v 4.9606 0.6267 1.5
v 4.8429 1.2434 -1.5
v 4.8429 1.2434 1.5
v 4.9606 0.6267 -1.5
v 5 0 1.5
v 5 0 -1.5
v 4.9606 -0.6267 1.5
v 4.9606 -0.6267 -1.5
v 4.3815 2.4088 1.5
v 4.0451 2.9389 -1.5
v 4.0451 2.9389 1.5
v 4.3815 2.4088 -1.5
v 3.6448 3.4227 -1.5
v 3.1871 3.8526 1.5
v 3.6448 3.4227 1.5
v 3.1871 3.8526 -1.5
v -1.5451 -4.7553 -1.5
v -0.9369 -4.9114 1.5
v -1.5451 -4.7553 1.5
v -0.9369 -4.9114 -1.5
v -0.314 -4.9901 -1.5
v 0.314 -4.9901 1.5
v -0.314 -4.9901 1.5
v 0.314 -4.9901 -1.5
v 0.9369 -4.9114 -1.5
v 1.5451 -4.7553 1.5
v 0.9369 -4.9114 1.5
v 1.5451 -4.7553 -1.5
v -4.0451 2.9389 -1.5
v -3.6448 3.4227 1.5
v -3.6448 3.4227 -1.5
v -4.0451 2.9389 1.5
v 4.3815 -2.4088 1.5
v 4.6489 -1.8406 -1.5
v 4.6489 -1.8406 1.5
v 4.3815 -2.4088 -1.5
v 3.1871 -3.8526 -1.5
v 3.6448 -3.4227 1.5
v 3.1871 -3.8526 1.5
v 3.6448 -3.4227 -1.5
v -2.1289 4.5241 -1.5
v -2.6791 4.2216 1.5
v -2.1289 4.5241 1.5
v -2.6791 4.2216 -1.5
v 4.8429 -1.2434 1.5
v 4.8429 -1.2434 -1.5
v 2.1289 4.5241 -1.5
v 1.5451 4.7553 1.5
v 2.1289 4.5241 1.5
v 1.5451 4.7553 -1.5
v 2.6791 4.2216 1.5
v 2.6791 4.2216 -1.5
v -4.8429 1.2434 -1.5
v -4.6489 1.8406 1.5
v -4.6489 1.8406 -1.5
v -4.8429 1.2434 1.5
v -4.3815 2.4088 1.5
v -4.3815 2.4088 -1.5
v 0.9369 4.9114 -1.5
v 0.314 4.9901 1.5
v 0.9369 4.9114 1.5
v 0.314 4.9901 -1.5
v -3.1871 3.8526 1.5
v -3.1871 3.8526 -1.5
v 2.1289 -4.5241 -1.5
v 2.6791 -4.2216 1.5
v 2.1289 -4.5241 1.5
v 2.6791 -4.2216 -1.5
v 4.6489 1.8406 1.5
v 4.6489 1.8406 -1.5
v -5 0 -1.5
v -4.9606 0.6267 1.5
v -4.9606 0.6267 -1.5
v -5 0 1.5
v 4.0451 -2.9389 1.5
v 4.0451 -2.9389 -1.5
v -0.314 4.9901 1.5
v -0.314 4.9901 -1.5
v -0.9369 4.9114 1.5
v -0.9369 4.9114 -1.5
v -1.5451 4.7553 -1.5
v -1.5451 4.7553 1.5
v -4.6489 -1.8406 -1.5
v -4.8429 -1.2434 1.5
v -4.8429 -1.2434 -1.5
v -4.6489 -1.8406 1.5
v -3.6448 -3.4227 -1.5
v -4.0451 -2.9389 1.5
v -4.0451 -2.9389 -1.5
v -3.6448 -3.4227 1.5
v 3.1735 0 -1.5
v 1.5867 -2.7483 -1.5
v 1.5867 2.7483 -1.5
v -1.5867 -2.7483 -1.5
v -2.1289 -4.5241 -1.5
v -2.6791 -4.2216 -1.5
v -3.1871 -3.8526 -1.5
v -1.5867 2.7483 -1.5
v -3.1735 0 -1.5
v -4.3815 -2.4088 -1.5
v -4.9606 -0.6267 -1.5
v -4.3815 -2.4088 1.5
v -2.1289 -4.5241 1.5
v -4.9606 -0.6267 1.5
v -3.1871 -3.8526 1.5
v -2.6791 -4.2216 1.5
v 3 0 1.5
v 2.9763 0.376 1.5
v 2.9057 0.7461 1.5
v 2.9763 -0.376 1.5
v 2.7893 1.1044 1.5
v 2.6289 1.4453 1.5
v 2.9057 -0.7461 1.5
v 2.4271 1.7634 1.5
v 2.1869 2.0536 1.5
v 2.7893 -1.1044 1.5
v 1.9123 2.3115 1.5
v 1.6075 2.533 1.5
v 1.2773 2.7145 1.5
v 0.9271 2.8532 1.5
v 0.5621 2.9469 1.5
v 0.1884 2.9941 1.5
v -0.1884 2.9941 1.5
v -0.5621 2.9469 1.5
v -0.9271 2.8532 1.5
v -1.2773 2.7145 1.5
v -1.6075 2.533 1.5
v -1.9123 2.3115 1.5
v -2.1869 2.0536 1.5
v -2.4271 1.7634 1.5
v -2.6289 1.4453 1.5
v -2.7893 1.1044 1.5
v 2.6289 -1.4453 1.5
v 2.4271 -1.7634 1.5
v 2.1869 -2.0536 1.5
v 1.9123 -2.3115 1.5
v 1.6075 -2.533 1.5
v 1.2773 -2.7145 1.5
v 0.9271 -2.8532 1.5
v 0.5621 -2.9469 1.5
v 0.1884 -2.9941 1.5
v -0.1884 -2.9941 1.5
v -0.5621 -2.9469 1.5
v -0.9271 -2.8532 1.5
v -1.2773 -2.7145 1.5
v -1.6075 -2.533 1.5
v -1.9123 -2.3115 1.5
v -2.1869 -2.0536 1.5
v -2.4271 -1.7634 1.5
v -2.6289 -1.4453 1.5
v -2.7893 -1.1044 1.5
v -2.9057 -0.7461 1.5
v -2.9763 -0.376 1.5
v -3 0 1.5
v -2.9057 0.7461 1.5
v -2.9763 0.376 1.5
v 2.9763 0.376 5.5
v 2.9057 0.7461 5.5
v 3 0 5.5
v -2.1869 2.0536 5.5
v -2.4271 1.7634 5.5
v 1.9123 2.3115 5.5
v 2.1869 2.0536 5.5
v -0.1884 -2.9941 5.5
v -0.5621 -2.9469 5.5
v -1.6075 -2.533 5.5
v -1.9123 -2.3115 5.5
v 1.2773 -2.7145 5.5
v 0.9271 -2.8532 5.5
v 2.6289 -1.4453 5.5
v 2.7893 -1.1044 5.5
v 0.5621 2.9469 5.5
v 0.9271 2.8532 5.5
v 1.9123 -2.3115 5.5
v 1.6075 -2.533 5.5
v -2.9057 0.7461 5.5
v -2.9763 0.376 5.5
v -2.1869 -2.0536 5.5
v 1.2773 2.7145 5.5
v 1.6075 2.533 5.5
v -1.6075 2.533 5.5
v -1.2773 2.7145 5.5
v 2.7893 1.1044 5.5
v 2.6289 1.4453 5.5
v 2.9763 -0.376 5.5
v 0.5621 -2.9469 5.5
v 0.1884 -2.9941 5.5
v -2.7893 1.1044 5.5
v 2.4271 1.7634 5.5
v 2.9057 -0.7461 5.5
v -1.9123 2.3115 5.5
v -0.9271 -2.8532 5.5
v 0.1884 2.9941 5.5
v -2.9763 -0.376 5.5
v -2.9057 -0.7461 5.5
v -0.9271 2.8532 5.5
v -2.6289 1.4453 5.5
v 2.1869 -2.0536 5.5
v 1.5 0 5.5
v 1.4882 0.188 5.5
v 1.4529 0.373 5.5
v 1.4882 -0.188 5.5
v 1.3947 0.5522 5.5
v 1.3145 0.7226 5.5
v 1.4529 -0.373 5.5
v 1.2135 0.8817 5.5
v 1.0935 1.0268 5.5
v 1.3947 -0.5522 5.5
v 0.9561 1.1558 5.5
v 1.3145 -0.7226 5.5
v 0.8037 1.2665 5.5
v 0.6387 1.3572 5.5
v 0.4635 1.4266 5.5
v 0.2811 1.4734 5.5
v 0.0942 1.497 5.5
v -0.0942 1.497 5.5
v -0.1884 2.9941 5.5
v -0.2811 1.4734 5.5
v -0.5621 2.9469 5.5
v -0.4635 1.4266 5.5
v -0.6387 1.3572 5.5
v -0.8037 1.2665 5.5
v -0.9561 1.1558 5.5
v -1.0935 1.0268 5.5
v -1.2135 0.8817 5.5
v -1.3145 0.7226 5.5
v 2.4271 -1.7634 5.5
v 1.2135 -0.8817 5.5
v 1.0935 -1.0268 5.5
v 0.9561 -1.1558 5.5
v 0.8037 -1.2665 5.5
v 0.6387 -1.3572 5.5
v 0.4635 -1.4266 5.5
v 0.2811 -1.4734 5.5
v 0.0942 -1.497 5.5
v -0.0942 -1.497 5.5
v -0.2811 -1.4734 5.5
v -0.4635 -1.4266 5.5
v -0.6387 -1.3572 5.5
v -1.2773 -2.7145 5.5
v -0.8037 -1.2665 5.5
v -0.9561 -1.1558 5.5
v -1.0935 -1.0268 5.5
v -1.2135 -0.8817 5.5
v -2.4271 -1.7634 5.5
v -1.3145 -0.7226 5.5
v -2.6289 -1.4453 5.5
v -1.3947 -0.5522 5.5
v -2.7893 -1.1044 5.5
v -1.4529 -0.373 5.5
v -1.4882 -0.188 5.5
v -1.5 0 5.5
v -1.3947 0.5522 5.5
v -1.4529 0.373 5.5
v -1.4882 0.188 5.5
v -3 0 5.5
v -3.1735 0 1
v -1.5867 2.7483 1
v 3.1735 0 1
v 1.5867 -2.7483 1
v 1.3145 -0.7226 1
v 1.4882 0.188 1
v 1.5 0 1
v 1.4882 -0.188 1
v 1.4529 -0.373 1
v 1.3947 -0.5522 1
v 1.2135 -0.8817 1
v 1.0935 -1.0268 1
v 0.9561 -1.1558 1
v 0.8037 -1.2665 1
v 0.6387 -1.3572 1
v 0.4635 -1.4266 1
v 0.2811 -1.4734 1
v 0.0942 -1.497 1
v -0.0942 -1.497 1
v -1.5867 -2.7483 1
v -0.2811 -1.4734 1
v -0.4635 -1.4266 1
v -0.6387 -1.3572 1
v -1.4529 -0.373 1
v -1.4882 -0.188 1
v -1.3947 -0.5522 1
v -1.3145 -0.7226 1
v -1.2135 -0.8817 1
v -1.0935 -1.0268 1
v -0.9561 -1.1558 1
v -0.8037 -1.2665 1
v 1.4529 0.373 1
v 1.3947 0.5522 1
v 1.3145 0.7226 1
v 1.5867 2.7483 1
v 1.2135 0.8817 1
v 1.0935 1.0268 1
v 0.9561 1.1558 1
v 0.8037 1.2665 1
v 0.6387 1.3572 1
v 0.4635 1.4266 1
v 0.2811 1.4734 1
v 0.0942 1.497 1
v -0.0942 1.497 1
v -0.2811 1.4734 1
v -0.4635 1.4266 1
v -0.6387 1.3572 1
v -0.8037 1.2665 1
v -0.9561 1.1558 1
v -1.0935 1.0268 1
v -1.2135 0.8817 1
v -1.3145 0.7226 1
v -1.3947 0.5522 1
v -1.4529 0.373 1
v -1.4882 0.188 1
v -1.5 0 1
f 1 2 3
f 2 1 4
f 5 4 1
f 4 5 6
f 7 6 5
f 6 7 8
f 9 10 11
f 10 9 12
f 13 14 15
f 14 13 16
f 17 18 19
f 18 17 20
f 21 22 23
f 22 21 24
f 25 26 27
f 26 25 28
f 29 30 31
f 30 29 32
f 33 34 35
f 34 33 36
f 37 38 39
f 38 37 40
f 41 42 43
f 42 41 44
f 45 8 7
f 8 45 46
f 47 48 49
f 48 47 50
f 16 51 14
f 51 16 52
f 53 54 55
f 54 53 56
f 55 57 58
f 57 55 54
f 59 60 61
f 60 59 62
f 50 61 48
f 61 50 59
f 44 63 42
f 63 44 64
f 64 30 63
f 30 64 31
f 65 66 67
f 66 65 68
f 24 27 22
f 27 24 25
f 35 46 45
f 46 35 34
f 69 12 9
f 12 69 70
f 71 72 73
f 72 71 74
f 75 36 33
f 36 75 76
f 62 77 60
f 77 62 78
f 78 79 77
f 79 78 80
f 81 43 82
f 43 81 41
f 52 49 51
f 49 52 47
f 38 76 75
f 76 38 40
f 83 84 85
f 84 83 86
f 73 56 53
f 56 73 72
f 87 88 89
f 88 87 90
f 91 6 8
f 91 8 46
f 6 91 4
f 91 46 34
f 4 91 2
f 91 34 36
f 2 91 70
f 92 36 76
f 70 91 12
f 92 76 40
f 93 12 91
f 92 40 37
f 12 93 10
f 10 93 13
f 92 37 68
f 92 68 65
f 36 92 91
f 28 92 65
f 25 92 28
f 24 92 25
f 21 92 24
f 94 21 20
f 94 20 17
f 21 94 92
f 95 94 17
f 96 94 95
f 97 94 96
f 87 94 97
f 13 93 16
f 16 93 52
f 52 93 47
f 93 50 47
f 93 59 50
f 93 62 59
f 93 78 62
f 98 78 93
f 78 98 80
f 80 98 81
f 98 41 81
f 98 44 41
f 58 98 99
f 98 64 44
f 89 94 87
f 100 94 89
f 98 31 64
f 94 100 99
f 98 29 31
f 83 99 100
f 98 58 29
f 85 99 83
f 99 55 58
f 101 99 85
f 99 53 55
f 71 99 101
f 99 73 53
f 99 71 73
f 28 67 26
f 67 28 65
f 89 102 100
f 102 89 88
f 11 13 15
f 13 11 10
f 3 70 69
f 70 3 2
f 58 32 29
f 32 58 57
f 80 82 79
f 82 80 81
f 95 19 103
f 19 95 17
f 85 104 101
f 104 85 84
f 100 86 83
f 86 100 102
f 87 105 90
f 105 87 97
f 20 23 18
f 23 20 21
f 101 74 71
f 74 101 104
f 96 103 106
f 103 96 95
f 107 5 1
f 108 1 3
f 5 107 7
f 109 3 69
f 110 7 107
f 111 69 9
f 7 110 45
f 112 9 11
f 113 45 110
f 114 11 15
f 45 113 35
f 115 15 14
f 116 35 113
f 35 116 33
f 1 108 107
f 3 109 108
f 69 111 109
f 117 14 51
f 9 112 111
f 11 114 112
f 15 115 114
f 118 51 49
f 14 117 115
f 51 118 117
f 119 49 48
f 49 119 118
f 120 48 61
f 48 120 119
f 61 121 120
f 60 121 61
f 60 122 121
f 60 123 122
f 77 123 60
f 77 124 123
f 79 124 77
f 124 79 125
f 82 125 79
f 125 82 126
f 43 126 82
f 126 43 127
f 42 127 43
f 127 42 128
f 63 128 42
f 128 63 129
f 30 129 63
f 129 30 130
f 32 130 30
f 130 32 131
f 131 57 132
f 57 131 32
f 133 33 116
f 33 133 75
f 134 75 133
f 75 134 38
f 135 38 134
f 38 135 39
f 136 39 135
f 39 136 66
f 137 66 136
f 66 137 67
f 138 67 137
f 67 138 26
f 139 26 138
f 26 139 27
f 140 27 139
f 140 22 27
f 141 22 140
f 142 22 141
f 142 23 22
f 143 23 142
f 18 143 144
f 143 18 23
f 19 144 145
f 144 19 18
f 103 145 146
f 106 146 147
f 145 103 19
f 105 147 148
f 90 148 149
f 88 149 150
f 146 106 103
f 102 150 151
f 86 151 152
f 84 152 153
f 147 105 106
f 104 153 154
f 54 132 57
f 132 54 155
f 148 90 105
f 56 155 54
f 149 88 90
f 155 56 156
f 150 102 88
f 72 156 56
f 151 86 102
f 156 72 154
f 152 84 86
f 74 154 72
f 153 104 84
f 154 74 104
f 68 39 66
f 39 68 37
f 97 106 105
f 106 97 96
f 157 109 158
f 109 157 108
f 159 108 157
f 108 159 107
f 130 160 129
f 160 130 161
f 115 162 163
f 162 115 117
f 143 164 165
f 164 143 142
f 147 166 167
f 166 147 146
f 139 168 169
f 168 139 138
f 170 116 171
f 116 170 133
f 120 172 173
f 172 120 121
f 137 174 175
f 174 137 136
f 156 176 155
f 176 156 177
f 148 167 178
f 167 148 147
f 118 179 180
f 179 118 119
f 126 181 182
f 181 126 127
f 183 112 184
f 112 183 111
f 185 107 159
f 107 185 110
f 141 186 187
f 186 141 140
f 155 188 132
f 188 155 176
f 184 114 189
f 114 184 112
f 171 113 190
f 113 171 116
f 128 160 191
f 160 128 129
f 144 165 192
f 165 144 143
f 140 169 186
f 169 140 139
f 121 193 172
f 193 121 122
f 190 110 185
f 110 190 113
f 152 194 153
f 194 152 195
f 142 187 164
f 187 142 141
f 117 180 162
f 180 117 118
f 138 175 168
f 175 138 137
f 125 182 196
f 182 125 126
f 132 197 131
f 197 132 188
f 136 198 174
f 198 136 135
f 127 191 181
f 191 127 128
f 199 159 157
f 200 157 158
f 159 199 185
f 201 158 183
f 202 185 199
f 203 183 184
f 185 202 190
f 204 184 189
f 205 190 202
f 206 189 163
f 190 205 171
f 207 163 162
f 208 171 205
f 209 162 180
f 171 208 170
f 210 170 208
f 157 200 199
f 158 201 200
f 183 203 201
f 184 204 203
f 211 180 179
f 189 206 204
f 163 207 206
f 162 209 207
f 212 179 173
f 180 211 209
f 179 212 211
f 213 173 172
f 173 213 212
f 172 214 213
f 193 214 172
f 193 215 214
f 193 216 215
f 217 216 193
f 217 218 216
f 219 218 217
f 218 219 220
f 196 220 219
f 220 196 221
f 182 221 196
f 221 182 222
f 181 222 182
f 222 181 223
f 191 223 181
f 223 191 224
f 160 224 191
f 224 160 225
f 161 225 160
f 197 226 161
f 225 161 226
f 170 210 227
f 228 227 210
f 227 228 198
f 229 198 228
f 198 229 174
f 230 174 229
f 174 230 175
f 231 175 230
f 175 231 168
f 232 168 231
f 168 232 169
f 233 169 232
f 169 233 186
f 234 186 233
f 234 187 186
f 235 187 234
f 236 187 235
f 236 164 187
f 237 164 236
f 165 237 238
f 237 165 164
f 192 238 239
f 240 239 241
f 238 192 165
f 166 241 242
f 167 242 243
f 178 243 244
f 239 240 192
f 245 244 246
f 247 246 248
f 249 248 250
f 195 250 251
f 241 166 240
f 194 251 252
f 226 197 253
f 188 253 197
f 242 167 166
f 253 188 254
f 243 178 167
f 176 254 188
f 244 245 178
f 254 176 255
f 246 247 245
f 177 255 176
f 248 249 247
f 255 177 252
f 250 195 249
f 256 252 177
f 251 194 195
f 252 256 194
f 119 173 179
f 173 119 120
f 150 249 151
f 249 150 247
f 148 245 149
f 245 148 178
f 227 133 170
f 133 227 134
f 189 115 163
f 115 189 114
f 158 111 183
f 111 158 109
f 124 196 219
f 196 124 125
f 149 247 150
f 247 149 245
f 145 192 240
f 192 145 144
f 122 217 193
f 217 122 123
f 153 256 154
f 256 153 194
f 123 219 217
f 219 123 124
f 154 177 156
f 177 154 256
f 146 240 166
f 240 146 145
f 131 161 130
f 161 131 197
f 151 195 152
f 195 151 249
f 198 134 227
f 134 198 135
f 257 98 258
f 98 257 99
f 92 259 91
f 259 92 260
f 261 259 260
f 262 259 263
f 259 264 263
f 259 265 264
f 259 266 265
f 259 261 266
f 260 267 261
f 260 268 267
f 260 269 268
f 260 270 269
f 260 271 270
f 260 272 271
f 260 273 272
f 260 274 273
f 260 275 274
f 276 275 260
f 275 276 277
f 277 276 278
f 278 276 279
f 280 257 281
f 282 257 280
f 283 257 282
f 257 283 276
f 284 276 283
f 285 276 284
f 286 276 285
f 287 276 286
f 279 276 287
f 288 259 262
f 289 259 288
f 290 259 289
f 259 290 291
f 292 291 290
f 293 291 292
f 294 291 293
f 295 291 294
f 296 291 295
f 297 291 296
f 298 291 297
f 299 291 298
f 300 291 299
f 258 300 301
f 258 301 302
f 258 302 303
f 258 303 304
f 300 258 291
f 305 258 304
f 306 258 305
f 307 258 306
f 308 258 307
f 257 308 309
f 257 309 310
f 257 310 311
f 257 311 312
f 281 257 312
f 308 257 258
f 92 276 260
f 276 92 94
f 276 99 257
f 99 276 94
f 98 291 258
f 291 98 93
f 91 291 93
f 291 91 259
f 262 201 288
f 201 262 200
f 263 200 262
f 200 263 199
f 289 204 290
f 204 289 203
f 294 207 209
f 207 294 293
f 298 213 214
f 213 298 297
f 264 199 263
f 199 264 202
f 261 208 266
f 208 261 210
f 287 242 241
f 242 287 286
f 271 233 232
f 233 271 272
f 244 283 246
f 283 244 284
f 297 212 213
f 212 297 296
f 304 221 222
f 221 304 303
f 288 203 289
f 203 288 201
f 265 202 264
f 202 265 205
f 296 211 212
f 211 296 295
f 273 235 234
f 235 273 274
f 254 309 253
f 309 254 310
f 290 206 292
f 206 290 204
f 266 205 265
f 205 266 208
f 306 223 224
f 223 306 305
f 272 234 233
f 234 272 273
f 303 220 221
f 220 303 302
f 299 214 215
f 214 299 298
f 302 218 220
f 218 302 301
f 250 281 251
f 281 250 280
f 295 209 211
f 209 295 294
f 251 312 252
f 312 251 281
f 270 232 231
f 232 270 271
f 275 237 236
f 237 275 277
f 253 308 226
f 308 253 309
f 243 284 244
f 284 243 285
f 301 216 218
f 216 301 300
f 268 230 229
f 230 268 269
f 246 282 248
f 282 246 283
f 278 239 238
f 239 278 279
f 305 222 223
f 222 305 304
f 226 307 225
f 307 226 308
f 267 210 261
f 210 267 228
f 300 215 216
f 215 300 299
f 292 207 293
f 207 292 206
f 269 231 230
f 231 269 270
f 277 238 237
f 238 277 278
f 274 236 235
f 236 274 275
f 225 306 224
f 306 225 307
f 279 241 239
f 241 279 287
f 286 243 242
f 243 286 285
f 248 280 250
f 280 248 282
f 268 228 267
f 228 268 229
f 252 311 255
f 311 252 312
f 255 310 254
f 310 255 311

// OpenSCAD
$fn = 50;


difference() {
	union() {
		translate(v = [0, 0, -1.5000000000]) {
			cylinder(h = 3, r = 5.0000000000);
		}
		translate(v = [0, 0, -1.5000000000]) {
			cylinder(h = 7, r = 3.0000000000);
		}
	}
	union() {
		translate(v = [0, 0, -1.5000000000]) {
			rotate(a = [0, 0, 0]) {
				difference() {
					union() {
						linear_extrude(height = 2.5000000000) {
							polygon(points = [[3.1735000000, 0.0000000000], [1.5867500000, 2.7483316189], [-1.5867500000, 2.7483316189], [-3.1735000000, 0.0000000000], [-1.5867500000, -2.7483316189], [1.5867500000, -2.7483316189]]);
						}
					}
					union();
				}
			}
		}
		translate(v = [0, 0, -100.0000000000]) {
			cylinder(h = 200, r = 1.5000000000);
		}
	}
}
